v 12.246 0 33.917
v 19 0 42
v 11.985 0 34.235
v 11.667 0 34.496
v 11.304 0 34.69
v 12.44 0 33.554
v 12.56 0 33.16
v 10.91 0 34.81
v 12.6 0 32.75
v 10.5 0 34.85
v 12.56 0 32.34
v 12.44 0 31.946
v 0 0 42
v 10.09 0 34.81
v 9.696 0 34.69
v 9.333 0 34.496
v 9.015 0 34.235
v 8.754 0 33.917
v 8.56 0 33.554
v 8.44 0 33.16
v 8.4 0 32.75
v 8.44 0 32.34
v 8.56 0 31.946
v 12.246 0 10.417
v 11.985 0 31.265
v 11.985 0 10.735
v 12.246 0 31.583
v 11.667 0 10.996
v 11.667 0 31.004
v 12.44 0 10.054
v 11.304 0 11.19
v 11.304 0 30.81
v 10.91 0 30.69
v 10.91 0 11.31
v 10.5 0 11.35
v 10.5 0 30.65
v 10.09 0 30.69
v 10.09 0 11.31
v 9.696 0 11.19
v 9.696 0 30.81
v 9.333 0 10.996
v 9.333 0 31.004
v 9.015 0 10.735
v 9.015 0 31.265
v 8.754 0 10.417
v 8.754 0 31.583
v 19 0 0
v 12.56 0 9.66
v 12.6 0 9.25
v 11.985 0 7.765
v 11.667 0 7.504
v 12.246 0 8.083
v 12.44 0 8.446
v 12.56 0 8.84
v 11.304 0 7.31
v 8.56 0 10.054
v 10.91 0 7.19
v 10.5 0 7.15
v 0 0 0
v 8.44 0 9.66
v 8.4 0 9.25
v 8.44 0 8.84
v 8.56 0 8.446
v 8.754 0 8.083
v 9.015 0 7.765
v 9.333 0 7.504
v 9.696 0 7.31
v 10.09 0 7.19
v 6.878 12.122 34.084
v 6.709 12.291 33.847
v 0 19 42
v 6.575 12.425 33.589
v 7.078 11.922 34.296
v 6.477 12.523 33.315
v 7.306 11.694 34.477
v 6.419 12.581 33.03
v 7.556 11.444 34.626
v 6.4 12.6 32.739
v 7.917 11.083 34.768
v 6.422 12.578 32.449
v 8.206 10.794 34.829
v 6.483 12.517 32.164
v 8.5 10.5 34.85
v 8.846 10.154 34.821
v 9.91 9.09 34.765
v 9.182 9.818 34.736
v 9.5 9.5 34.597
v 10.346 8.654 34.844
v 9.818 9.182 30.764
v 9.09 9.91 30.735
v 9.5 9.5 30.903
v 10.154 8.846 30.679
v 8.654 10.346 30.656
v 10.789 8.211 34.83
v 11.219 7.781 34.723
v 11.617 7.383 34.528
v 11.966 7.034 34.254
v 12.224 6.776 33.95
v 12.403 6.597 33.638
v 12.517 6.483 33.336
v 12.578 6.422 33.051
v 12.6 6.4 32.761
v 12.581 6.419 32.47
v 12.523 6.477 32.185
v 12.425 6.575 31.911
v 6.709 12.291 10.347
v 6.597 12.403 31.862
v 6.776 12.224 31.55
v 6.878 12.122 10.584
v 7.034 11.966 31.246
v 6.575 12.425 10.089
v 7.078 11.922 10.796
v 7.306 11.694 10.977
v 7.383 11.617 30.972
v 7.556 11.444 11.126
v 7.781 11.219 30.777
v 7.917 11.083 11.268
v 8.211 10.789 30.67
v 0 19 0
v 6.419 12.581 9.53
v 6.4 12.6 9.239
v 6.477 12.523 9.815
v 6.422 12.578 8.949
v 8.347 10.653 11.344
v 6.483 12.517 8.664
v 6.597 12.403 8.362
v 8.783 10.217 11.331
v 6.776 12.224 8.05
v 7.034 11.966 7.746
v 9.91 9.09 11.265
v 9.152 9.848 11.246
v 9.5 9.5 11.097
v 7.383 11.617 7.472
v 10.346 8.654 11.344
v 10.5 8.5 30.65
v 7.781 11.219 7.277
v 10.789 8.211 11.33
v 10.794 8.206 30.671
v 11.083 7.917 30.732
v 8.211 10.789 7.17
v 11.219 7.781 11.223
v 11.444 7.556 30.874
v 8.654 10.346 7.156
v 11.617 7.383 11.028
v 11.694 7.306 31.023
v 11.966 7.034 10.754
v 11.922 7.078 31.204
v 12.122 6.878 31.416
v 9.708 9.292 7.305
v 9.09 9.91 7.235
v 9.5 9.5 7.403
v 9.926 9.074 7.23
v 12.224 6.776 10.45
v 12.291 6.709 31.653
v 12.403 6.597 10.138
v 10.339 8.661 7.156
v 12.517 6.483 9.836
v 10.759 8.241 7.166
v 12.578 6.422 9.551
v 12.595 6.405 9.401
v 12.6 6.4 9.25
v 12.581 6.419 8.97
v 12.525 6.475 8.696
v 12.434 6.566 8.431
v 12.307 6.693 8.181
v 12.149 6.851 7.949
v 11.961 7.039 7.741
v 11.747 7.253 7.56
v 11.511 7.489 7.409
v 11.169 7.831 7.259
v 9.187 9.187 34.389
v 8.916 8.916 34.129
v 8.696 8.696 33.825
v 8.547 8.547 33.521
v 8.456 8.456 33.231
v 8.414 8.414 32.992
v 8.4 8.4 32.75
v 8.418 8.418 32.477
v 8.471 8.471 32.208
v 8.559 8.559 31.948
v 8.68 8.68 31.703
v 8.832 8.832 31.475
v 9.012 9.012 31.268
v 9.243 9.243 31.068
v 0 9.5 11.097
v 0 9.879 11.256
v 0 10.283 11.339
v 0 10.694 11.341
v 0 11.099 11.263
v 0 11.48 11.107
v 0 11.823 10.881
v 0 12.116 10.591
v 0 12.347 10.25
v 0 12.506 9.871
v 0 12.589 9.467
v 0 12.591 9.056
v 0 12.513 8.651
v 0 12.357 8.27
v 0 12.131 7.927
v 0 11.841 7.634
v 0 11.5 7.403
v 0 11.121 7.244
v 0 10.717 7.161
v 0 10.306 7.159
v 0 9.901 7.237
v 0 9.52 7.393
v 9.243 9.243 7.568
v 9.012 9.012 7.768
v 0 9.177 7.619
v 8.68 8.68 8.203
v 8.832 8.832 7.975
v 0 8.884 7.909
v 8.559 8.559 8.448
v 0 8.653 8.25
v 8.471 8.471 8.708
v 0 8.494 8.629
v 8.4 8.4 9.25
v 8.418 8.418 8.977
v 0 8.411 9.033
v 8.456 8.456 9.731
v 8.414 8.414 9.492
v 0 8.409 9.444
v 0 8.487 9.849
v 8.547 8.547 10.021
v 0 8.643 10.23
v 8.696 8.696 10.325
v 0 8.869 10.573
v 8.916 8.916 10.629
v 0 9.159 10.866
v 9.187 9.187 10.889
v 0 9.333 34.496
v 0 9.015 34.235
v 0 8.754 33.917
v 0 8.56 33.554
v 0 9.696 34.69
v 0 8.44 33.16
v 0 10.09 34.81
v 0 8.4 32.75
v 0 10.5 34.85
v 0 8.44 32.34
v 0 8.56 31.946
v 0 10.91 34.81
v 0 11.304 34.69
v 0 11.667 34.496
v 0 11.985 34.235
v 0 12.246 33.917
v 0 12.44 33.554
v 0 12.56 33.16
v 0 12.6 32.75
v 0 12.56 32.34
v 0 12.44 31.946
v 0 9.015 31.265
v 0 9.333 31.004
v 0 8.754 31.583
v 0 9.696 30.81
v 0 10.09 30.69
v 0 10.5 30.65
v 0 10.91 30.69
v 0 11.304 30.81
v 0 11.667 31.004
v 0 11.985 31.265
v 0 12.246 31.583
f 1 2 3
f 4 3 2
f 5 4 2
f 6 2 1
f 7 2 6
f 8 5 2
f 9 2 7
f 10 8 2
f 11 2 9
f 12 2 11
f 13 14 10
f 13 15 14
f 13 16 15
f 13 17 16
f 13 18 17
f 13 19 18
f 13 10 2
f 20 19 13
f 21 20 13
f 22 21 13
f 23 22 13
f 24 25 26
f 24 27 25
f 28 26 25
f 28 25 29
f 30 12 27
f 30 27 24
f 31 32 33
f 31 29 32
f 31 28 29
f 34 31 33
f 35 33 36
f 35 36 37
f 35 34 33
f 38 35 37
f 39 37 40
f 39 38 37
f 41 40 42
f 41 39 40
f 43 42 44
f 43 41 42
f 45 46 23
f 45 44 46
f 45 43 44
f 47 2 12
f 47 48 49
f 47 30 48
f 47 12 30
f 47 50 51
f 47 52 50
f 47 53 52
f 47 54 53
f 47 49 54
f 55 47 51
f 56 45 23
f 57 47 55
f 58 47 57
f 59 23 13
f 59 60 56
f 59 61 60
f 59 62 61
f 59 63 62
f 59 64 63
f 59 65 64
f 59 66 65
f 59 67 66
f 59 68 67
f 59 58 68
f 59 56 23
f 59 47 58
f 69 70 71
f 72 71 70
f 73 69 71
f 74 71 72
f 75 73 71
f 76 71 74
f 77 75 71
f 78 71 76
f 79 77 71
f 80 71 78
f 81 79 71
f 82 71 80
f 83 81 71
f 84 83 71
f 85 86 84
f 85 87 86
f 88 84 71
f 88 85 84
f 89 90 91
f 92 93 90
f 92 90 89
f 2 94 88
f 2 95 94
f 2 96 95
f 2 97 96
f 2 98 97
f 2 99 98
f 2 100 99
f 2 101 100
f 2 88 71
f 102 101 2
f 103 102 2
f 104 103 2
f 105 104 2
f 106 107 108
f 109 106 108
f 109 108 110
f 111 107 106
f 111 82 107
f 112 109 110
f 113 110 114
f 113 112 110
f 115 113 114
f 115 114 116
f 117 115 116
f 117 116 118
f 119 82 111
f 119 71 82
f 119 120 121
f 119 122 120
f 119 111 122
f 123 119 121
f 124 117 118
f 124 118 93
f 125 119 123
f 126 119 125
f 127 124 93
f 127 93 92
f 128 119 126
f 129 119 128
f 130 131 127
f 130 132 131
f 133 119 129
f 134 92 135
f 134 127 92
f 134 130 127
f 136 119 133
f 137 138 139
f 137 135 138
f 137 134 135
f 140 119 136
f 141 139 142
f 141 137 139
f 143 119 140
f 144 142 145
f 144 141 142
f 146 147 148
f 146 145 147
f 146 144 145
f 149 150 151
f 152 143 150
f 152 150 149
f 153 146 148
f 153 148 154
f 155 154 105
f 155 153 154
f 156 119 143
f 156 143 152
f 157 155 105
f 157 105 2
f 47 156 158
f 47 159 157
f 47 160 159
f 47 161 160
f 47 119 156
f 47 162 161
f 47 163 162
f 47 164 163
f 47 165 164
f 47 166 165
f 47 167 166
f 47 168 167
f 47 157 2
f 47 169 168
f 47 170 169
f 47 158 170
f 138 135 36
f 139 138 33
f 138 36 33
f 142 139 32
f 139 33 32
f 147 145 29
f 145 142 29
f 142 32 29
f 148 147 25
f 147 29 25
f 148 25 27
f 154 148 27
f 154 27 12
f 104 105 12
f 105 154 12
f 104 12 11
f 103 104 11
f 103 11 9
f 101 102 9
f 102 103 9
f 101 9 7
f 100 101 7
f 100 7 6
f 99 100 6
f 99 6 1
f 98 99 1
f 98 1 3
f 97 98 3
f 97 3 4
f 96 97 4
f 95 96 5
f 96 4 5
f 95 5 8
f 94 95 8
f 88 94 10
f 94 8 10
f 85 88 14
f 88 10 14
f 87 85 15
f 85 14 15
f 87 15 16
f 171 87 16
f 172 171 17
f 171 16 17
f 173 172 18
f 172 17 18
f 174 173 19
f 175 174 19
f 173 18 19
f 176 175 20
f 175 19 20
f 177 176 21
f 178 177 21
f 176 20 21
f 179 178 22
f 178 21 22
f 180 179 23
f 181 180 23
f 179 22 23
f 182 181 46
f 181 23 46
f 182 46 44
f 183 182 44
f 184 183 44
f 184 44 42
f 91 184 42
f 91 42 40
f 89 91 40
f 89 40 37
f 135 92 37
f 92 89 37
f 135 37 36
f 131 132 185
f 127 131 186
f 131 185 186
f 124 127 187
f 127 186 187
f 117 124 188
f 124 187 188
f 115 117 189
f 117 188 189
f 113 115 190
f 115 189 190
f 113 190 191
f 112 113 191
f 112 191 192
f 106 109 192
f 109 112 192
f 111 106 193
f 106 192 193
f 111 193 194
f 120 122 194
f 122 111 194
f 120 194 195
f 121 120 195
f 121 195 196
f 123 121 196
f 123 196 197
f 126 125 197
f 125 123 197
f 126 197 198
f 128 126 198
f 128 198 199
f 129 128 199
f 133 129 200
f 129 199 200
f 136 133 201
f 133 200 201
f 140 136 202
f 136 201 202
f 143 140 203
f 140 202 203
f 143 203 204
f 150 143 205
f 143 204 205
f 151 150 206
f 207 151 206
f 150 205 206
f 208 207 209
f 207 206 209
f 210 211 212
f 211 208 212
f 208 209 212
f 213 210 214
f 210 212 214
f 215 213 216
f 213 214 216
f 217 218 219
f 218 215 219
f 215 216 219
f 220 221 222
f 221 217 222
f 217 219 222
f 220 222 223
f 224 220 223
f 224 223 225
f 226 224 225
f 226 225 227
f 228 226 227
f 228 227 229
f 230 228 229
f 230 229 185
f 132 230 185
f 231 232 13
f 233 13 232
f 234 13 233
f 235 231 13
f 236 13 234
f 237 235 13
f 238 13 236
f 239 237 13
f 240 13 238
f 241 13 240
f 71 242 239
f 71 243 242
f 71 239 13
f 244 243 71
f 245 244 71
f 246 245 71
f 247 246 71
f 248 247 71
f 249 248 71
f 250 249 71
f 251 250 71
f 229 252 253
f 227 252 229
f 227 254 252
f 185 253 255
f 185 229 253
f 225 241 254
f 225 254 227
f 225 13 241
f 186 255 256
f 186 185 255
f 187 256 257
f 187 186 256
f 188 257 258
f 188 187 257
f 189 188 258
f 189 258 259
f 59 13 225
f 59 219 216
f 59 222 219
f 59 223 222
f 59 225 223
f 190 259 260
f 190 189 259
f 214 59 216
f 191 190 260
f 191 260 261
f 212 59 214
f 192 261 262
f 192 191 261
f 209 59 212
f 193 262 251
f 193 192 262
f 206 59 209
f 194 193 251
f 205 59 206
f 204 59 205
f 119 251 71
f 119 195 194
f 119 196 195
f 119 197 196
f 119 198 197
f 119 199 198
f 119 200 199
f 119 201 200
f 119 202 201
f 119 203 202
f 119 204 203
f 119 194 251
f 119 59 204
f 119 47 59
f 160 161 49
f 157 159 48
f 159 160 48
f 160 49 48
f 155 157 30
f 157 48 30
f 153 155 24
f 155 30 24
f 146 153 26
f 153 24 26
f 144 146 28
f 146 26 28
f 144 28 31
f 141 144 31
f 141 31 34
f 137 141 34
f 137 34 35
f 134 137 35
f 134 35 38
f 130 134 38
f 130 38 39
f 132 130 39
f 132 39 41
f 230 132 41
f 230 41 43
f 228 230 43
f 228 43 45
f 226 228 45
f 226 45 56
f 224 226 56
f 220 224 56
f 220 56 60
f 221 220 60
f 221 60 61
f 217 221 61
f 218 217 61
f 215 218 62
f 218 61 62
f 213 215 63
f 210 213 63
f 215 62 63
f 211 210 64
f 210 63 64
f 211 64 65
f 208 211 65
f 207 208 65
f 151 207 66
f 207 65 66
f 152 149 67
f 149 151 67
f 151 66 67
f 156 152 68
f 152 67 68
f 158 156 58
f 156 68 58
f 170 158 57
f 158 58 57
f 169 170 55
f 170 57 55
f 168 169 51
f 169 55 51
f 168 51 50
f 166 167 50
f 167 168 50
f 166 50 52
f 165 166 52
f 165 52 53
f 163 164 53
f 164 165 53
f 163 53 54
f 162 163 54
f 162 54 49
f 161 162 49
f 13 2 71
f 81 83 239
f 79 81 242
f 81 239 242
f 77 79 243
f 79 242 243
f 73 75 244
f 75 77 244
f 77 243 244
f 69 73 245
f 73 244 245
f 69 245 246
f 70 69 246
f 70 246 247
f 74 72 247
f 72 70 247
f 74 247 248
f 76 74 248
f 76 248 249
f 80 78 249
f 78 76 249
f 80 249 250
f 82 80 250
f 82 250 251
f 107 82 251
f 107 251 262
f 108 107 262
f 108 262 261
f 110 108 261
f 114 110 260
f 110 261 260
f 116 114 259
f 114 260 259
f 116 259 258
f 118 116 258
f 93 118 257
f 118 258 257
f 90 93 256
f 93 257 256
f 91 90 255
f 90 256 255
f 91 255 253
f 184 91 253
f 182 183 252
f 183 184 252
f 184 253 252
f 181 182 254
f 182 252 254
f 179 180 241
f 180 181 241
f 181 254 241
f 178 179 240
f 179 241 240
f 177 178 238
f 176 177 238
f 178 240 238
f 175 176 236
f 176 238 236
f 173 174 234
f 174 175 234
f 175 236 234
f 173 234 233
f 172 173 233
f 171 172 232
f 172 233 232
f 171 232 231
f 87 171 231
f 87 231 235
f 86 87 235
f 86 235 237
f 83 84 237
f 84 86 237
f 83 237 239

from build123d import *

# Parameters (mm, degrees)
EXTRUDE_2_DEPTH     = 42
SKETCH_4_R          = 2.1
CUT_EXTRUDE_2_DEPTH = 42
SKETCH_5_R          = 2.1
CUT_EXTRUDE_3_DEPTH = 42


with BuildPart() as part:
    # 草图1 → 凸台-拉伸2 (new body)
    with BuildSketch(Plane.XY):
        Polygon((19, 0), (0, 0), (0, 19), align=None)
    extrude(amount=EXTRUDE_2_DEPTH)

    # 草图4 → 切除-拉伸2 (cut)
    with BuildSketch(Plane(origin=(0, 0, 0), x_dir=(-1, 0, 0), z_dir=(0, -1, 0))):
        with Locations(Location((-10.5, -32.75, 0), (0, 0, 90))):
            Circle(SKETCH_4_R)
        with Locations(Location((-10.5, -9.25, 0), (0, 0, 180))):
            Circle(SKETCH_4_R)
    extrude(amount=-CUT_EXTRUDE_2_DEPTH, mode=Mode.SUBTRACT)

    # 草图5 → 切除-拉伸3 (cut)
    with BuildSketch(Plane.ZY):
        with Locations((32.75, 10.5)):
            Circle(SKETCH_5_R)
        with Locations(Location((9.25, 10.5, 0), (0, 0, 331.563109851))):
            Circle(SKETCH_5_R)
    extrude(amount=-CUT_EXTRUDE_3_DEPTH, mode=Mode.SUBTRACT)


solid = part.part
